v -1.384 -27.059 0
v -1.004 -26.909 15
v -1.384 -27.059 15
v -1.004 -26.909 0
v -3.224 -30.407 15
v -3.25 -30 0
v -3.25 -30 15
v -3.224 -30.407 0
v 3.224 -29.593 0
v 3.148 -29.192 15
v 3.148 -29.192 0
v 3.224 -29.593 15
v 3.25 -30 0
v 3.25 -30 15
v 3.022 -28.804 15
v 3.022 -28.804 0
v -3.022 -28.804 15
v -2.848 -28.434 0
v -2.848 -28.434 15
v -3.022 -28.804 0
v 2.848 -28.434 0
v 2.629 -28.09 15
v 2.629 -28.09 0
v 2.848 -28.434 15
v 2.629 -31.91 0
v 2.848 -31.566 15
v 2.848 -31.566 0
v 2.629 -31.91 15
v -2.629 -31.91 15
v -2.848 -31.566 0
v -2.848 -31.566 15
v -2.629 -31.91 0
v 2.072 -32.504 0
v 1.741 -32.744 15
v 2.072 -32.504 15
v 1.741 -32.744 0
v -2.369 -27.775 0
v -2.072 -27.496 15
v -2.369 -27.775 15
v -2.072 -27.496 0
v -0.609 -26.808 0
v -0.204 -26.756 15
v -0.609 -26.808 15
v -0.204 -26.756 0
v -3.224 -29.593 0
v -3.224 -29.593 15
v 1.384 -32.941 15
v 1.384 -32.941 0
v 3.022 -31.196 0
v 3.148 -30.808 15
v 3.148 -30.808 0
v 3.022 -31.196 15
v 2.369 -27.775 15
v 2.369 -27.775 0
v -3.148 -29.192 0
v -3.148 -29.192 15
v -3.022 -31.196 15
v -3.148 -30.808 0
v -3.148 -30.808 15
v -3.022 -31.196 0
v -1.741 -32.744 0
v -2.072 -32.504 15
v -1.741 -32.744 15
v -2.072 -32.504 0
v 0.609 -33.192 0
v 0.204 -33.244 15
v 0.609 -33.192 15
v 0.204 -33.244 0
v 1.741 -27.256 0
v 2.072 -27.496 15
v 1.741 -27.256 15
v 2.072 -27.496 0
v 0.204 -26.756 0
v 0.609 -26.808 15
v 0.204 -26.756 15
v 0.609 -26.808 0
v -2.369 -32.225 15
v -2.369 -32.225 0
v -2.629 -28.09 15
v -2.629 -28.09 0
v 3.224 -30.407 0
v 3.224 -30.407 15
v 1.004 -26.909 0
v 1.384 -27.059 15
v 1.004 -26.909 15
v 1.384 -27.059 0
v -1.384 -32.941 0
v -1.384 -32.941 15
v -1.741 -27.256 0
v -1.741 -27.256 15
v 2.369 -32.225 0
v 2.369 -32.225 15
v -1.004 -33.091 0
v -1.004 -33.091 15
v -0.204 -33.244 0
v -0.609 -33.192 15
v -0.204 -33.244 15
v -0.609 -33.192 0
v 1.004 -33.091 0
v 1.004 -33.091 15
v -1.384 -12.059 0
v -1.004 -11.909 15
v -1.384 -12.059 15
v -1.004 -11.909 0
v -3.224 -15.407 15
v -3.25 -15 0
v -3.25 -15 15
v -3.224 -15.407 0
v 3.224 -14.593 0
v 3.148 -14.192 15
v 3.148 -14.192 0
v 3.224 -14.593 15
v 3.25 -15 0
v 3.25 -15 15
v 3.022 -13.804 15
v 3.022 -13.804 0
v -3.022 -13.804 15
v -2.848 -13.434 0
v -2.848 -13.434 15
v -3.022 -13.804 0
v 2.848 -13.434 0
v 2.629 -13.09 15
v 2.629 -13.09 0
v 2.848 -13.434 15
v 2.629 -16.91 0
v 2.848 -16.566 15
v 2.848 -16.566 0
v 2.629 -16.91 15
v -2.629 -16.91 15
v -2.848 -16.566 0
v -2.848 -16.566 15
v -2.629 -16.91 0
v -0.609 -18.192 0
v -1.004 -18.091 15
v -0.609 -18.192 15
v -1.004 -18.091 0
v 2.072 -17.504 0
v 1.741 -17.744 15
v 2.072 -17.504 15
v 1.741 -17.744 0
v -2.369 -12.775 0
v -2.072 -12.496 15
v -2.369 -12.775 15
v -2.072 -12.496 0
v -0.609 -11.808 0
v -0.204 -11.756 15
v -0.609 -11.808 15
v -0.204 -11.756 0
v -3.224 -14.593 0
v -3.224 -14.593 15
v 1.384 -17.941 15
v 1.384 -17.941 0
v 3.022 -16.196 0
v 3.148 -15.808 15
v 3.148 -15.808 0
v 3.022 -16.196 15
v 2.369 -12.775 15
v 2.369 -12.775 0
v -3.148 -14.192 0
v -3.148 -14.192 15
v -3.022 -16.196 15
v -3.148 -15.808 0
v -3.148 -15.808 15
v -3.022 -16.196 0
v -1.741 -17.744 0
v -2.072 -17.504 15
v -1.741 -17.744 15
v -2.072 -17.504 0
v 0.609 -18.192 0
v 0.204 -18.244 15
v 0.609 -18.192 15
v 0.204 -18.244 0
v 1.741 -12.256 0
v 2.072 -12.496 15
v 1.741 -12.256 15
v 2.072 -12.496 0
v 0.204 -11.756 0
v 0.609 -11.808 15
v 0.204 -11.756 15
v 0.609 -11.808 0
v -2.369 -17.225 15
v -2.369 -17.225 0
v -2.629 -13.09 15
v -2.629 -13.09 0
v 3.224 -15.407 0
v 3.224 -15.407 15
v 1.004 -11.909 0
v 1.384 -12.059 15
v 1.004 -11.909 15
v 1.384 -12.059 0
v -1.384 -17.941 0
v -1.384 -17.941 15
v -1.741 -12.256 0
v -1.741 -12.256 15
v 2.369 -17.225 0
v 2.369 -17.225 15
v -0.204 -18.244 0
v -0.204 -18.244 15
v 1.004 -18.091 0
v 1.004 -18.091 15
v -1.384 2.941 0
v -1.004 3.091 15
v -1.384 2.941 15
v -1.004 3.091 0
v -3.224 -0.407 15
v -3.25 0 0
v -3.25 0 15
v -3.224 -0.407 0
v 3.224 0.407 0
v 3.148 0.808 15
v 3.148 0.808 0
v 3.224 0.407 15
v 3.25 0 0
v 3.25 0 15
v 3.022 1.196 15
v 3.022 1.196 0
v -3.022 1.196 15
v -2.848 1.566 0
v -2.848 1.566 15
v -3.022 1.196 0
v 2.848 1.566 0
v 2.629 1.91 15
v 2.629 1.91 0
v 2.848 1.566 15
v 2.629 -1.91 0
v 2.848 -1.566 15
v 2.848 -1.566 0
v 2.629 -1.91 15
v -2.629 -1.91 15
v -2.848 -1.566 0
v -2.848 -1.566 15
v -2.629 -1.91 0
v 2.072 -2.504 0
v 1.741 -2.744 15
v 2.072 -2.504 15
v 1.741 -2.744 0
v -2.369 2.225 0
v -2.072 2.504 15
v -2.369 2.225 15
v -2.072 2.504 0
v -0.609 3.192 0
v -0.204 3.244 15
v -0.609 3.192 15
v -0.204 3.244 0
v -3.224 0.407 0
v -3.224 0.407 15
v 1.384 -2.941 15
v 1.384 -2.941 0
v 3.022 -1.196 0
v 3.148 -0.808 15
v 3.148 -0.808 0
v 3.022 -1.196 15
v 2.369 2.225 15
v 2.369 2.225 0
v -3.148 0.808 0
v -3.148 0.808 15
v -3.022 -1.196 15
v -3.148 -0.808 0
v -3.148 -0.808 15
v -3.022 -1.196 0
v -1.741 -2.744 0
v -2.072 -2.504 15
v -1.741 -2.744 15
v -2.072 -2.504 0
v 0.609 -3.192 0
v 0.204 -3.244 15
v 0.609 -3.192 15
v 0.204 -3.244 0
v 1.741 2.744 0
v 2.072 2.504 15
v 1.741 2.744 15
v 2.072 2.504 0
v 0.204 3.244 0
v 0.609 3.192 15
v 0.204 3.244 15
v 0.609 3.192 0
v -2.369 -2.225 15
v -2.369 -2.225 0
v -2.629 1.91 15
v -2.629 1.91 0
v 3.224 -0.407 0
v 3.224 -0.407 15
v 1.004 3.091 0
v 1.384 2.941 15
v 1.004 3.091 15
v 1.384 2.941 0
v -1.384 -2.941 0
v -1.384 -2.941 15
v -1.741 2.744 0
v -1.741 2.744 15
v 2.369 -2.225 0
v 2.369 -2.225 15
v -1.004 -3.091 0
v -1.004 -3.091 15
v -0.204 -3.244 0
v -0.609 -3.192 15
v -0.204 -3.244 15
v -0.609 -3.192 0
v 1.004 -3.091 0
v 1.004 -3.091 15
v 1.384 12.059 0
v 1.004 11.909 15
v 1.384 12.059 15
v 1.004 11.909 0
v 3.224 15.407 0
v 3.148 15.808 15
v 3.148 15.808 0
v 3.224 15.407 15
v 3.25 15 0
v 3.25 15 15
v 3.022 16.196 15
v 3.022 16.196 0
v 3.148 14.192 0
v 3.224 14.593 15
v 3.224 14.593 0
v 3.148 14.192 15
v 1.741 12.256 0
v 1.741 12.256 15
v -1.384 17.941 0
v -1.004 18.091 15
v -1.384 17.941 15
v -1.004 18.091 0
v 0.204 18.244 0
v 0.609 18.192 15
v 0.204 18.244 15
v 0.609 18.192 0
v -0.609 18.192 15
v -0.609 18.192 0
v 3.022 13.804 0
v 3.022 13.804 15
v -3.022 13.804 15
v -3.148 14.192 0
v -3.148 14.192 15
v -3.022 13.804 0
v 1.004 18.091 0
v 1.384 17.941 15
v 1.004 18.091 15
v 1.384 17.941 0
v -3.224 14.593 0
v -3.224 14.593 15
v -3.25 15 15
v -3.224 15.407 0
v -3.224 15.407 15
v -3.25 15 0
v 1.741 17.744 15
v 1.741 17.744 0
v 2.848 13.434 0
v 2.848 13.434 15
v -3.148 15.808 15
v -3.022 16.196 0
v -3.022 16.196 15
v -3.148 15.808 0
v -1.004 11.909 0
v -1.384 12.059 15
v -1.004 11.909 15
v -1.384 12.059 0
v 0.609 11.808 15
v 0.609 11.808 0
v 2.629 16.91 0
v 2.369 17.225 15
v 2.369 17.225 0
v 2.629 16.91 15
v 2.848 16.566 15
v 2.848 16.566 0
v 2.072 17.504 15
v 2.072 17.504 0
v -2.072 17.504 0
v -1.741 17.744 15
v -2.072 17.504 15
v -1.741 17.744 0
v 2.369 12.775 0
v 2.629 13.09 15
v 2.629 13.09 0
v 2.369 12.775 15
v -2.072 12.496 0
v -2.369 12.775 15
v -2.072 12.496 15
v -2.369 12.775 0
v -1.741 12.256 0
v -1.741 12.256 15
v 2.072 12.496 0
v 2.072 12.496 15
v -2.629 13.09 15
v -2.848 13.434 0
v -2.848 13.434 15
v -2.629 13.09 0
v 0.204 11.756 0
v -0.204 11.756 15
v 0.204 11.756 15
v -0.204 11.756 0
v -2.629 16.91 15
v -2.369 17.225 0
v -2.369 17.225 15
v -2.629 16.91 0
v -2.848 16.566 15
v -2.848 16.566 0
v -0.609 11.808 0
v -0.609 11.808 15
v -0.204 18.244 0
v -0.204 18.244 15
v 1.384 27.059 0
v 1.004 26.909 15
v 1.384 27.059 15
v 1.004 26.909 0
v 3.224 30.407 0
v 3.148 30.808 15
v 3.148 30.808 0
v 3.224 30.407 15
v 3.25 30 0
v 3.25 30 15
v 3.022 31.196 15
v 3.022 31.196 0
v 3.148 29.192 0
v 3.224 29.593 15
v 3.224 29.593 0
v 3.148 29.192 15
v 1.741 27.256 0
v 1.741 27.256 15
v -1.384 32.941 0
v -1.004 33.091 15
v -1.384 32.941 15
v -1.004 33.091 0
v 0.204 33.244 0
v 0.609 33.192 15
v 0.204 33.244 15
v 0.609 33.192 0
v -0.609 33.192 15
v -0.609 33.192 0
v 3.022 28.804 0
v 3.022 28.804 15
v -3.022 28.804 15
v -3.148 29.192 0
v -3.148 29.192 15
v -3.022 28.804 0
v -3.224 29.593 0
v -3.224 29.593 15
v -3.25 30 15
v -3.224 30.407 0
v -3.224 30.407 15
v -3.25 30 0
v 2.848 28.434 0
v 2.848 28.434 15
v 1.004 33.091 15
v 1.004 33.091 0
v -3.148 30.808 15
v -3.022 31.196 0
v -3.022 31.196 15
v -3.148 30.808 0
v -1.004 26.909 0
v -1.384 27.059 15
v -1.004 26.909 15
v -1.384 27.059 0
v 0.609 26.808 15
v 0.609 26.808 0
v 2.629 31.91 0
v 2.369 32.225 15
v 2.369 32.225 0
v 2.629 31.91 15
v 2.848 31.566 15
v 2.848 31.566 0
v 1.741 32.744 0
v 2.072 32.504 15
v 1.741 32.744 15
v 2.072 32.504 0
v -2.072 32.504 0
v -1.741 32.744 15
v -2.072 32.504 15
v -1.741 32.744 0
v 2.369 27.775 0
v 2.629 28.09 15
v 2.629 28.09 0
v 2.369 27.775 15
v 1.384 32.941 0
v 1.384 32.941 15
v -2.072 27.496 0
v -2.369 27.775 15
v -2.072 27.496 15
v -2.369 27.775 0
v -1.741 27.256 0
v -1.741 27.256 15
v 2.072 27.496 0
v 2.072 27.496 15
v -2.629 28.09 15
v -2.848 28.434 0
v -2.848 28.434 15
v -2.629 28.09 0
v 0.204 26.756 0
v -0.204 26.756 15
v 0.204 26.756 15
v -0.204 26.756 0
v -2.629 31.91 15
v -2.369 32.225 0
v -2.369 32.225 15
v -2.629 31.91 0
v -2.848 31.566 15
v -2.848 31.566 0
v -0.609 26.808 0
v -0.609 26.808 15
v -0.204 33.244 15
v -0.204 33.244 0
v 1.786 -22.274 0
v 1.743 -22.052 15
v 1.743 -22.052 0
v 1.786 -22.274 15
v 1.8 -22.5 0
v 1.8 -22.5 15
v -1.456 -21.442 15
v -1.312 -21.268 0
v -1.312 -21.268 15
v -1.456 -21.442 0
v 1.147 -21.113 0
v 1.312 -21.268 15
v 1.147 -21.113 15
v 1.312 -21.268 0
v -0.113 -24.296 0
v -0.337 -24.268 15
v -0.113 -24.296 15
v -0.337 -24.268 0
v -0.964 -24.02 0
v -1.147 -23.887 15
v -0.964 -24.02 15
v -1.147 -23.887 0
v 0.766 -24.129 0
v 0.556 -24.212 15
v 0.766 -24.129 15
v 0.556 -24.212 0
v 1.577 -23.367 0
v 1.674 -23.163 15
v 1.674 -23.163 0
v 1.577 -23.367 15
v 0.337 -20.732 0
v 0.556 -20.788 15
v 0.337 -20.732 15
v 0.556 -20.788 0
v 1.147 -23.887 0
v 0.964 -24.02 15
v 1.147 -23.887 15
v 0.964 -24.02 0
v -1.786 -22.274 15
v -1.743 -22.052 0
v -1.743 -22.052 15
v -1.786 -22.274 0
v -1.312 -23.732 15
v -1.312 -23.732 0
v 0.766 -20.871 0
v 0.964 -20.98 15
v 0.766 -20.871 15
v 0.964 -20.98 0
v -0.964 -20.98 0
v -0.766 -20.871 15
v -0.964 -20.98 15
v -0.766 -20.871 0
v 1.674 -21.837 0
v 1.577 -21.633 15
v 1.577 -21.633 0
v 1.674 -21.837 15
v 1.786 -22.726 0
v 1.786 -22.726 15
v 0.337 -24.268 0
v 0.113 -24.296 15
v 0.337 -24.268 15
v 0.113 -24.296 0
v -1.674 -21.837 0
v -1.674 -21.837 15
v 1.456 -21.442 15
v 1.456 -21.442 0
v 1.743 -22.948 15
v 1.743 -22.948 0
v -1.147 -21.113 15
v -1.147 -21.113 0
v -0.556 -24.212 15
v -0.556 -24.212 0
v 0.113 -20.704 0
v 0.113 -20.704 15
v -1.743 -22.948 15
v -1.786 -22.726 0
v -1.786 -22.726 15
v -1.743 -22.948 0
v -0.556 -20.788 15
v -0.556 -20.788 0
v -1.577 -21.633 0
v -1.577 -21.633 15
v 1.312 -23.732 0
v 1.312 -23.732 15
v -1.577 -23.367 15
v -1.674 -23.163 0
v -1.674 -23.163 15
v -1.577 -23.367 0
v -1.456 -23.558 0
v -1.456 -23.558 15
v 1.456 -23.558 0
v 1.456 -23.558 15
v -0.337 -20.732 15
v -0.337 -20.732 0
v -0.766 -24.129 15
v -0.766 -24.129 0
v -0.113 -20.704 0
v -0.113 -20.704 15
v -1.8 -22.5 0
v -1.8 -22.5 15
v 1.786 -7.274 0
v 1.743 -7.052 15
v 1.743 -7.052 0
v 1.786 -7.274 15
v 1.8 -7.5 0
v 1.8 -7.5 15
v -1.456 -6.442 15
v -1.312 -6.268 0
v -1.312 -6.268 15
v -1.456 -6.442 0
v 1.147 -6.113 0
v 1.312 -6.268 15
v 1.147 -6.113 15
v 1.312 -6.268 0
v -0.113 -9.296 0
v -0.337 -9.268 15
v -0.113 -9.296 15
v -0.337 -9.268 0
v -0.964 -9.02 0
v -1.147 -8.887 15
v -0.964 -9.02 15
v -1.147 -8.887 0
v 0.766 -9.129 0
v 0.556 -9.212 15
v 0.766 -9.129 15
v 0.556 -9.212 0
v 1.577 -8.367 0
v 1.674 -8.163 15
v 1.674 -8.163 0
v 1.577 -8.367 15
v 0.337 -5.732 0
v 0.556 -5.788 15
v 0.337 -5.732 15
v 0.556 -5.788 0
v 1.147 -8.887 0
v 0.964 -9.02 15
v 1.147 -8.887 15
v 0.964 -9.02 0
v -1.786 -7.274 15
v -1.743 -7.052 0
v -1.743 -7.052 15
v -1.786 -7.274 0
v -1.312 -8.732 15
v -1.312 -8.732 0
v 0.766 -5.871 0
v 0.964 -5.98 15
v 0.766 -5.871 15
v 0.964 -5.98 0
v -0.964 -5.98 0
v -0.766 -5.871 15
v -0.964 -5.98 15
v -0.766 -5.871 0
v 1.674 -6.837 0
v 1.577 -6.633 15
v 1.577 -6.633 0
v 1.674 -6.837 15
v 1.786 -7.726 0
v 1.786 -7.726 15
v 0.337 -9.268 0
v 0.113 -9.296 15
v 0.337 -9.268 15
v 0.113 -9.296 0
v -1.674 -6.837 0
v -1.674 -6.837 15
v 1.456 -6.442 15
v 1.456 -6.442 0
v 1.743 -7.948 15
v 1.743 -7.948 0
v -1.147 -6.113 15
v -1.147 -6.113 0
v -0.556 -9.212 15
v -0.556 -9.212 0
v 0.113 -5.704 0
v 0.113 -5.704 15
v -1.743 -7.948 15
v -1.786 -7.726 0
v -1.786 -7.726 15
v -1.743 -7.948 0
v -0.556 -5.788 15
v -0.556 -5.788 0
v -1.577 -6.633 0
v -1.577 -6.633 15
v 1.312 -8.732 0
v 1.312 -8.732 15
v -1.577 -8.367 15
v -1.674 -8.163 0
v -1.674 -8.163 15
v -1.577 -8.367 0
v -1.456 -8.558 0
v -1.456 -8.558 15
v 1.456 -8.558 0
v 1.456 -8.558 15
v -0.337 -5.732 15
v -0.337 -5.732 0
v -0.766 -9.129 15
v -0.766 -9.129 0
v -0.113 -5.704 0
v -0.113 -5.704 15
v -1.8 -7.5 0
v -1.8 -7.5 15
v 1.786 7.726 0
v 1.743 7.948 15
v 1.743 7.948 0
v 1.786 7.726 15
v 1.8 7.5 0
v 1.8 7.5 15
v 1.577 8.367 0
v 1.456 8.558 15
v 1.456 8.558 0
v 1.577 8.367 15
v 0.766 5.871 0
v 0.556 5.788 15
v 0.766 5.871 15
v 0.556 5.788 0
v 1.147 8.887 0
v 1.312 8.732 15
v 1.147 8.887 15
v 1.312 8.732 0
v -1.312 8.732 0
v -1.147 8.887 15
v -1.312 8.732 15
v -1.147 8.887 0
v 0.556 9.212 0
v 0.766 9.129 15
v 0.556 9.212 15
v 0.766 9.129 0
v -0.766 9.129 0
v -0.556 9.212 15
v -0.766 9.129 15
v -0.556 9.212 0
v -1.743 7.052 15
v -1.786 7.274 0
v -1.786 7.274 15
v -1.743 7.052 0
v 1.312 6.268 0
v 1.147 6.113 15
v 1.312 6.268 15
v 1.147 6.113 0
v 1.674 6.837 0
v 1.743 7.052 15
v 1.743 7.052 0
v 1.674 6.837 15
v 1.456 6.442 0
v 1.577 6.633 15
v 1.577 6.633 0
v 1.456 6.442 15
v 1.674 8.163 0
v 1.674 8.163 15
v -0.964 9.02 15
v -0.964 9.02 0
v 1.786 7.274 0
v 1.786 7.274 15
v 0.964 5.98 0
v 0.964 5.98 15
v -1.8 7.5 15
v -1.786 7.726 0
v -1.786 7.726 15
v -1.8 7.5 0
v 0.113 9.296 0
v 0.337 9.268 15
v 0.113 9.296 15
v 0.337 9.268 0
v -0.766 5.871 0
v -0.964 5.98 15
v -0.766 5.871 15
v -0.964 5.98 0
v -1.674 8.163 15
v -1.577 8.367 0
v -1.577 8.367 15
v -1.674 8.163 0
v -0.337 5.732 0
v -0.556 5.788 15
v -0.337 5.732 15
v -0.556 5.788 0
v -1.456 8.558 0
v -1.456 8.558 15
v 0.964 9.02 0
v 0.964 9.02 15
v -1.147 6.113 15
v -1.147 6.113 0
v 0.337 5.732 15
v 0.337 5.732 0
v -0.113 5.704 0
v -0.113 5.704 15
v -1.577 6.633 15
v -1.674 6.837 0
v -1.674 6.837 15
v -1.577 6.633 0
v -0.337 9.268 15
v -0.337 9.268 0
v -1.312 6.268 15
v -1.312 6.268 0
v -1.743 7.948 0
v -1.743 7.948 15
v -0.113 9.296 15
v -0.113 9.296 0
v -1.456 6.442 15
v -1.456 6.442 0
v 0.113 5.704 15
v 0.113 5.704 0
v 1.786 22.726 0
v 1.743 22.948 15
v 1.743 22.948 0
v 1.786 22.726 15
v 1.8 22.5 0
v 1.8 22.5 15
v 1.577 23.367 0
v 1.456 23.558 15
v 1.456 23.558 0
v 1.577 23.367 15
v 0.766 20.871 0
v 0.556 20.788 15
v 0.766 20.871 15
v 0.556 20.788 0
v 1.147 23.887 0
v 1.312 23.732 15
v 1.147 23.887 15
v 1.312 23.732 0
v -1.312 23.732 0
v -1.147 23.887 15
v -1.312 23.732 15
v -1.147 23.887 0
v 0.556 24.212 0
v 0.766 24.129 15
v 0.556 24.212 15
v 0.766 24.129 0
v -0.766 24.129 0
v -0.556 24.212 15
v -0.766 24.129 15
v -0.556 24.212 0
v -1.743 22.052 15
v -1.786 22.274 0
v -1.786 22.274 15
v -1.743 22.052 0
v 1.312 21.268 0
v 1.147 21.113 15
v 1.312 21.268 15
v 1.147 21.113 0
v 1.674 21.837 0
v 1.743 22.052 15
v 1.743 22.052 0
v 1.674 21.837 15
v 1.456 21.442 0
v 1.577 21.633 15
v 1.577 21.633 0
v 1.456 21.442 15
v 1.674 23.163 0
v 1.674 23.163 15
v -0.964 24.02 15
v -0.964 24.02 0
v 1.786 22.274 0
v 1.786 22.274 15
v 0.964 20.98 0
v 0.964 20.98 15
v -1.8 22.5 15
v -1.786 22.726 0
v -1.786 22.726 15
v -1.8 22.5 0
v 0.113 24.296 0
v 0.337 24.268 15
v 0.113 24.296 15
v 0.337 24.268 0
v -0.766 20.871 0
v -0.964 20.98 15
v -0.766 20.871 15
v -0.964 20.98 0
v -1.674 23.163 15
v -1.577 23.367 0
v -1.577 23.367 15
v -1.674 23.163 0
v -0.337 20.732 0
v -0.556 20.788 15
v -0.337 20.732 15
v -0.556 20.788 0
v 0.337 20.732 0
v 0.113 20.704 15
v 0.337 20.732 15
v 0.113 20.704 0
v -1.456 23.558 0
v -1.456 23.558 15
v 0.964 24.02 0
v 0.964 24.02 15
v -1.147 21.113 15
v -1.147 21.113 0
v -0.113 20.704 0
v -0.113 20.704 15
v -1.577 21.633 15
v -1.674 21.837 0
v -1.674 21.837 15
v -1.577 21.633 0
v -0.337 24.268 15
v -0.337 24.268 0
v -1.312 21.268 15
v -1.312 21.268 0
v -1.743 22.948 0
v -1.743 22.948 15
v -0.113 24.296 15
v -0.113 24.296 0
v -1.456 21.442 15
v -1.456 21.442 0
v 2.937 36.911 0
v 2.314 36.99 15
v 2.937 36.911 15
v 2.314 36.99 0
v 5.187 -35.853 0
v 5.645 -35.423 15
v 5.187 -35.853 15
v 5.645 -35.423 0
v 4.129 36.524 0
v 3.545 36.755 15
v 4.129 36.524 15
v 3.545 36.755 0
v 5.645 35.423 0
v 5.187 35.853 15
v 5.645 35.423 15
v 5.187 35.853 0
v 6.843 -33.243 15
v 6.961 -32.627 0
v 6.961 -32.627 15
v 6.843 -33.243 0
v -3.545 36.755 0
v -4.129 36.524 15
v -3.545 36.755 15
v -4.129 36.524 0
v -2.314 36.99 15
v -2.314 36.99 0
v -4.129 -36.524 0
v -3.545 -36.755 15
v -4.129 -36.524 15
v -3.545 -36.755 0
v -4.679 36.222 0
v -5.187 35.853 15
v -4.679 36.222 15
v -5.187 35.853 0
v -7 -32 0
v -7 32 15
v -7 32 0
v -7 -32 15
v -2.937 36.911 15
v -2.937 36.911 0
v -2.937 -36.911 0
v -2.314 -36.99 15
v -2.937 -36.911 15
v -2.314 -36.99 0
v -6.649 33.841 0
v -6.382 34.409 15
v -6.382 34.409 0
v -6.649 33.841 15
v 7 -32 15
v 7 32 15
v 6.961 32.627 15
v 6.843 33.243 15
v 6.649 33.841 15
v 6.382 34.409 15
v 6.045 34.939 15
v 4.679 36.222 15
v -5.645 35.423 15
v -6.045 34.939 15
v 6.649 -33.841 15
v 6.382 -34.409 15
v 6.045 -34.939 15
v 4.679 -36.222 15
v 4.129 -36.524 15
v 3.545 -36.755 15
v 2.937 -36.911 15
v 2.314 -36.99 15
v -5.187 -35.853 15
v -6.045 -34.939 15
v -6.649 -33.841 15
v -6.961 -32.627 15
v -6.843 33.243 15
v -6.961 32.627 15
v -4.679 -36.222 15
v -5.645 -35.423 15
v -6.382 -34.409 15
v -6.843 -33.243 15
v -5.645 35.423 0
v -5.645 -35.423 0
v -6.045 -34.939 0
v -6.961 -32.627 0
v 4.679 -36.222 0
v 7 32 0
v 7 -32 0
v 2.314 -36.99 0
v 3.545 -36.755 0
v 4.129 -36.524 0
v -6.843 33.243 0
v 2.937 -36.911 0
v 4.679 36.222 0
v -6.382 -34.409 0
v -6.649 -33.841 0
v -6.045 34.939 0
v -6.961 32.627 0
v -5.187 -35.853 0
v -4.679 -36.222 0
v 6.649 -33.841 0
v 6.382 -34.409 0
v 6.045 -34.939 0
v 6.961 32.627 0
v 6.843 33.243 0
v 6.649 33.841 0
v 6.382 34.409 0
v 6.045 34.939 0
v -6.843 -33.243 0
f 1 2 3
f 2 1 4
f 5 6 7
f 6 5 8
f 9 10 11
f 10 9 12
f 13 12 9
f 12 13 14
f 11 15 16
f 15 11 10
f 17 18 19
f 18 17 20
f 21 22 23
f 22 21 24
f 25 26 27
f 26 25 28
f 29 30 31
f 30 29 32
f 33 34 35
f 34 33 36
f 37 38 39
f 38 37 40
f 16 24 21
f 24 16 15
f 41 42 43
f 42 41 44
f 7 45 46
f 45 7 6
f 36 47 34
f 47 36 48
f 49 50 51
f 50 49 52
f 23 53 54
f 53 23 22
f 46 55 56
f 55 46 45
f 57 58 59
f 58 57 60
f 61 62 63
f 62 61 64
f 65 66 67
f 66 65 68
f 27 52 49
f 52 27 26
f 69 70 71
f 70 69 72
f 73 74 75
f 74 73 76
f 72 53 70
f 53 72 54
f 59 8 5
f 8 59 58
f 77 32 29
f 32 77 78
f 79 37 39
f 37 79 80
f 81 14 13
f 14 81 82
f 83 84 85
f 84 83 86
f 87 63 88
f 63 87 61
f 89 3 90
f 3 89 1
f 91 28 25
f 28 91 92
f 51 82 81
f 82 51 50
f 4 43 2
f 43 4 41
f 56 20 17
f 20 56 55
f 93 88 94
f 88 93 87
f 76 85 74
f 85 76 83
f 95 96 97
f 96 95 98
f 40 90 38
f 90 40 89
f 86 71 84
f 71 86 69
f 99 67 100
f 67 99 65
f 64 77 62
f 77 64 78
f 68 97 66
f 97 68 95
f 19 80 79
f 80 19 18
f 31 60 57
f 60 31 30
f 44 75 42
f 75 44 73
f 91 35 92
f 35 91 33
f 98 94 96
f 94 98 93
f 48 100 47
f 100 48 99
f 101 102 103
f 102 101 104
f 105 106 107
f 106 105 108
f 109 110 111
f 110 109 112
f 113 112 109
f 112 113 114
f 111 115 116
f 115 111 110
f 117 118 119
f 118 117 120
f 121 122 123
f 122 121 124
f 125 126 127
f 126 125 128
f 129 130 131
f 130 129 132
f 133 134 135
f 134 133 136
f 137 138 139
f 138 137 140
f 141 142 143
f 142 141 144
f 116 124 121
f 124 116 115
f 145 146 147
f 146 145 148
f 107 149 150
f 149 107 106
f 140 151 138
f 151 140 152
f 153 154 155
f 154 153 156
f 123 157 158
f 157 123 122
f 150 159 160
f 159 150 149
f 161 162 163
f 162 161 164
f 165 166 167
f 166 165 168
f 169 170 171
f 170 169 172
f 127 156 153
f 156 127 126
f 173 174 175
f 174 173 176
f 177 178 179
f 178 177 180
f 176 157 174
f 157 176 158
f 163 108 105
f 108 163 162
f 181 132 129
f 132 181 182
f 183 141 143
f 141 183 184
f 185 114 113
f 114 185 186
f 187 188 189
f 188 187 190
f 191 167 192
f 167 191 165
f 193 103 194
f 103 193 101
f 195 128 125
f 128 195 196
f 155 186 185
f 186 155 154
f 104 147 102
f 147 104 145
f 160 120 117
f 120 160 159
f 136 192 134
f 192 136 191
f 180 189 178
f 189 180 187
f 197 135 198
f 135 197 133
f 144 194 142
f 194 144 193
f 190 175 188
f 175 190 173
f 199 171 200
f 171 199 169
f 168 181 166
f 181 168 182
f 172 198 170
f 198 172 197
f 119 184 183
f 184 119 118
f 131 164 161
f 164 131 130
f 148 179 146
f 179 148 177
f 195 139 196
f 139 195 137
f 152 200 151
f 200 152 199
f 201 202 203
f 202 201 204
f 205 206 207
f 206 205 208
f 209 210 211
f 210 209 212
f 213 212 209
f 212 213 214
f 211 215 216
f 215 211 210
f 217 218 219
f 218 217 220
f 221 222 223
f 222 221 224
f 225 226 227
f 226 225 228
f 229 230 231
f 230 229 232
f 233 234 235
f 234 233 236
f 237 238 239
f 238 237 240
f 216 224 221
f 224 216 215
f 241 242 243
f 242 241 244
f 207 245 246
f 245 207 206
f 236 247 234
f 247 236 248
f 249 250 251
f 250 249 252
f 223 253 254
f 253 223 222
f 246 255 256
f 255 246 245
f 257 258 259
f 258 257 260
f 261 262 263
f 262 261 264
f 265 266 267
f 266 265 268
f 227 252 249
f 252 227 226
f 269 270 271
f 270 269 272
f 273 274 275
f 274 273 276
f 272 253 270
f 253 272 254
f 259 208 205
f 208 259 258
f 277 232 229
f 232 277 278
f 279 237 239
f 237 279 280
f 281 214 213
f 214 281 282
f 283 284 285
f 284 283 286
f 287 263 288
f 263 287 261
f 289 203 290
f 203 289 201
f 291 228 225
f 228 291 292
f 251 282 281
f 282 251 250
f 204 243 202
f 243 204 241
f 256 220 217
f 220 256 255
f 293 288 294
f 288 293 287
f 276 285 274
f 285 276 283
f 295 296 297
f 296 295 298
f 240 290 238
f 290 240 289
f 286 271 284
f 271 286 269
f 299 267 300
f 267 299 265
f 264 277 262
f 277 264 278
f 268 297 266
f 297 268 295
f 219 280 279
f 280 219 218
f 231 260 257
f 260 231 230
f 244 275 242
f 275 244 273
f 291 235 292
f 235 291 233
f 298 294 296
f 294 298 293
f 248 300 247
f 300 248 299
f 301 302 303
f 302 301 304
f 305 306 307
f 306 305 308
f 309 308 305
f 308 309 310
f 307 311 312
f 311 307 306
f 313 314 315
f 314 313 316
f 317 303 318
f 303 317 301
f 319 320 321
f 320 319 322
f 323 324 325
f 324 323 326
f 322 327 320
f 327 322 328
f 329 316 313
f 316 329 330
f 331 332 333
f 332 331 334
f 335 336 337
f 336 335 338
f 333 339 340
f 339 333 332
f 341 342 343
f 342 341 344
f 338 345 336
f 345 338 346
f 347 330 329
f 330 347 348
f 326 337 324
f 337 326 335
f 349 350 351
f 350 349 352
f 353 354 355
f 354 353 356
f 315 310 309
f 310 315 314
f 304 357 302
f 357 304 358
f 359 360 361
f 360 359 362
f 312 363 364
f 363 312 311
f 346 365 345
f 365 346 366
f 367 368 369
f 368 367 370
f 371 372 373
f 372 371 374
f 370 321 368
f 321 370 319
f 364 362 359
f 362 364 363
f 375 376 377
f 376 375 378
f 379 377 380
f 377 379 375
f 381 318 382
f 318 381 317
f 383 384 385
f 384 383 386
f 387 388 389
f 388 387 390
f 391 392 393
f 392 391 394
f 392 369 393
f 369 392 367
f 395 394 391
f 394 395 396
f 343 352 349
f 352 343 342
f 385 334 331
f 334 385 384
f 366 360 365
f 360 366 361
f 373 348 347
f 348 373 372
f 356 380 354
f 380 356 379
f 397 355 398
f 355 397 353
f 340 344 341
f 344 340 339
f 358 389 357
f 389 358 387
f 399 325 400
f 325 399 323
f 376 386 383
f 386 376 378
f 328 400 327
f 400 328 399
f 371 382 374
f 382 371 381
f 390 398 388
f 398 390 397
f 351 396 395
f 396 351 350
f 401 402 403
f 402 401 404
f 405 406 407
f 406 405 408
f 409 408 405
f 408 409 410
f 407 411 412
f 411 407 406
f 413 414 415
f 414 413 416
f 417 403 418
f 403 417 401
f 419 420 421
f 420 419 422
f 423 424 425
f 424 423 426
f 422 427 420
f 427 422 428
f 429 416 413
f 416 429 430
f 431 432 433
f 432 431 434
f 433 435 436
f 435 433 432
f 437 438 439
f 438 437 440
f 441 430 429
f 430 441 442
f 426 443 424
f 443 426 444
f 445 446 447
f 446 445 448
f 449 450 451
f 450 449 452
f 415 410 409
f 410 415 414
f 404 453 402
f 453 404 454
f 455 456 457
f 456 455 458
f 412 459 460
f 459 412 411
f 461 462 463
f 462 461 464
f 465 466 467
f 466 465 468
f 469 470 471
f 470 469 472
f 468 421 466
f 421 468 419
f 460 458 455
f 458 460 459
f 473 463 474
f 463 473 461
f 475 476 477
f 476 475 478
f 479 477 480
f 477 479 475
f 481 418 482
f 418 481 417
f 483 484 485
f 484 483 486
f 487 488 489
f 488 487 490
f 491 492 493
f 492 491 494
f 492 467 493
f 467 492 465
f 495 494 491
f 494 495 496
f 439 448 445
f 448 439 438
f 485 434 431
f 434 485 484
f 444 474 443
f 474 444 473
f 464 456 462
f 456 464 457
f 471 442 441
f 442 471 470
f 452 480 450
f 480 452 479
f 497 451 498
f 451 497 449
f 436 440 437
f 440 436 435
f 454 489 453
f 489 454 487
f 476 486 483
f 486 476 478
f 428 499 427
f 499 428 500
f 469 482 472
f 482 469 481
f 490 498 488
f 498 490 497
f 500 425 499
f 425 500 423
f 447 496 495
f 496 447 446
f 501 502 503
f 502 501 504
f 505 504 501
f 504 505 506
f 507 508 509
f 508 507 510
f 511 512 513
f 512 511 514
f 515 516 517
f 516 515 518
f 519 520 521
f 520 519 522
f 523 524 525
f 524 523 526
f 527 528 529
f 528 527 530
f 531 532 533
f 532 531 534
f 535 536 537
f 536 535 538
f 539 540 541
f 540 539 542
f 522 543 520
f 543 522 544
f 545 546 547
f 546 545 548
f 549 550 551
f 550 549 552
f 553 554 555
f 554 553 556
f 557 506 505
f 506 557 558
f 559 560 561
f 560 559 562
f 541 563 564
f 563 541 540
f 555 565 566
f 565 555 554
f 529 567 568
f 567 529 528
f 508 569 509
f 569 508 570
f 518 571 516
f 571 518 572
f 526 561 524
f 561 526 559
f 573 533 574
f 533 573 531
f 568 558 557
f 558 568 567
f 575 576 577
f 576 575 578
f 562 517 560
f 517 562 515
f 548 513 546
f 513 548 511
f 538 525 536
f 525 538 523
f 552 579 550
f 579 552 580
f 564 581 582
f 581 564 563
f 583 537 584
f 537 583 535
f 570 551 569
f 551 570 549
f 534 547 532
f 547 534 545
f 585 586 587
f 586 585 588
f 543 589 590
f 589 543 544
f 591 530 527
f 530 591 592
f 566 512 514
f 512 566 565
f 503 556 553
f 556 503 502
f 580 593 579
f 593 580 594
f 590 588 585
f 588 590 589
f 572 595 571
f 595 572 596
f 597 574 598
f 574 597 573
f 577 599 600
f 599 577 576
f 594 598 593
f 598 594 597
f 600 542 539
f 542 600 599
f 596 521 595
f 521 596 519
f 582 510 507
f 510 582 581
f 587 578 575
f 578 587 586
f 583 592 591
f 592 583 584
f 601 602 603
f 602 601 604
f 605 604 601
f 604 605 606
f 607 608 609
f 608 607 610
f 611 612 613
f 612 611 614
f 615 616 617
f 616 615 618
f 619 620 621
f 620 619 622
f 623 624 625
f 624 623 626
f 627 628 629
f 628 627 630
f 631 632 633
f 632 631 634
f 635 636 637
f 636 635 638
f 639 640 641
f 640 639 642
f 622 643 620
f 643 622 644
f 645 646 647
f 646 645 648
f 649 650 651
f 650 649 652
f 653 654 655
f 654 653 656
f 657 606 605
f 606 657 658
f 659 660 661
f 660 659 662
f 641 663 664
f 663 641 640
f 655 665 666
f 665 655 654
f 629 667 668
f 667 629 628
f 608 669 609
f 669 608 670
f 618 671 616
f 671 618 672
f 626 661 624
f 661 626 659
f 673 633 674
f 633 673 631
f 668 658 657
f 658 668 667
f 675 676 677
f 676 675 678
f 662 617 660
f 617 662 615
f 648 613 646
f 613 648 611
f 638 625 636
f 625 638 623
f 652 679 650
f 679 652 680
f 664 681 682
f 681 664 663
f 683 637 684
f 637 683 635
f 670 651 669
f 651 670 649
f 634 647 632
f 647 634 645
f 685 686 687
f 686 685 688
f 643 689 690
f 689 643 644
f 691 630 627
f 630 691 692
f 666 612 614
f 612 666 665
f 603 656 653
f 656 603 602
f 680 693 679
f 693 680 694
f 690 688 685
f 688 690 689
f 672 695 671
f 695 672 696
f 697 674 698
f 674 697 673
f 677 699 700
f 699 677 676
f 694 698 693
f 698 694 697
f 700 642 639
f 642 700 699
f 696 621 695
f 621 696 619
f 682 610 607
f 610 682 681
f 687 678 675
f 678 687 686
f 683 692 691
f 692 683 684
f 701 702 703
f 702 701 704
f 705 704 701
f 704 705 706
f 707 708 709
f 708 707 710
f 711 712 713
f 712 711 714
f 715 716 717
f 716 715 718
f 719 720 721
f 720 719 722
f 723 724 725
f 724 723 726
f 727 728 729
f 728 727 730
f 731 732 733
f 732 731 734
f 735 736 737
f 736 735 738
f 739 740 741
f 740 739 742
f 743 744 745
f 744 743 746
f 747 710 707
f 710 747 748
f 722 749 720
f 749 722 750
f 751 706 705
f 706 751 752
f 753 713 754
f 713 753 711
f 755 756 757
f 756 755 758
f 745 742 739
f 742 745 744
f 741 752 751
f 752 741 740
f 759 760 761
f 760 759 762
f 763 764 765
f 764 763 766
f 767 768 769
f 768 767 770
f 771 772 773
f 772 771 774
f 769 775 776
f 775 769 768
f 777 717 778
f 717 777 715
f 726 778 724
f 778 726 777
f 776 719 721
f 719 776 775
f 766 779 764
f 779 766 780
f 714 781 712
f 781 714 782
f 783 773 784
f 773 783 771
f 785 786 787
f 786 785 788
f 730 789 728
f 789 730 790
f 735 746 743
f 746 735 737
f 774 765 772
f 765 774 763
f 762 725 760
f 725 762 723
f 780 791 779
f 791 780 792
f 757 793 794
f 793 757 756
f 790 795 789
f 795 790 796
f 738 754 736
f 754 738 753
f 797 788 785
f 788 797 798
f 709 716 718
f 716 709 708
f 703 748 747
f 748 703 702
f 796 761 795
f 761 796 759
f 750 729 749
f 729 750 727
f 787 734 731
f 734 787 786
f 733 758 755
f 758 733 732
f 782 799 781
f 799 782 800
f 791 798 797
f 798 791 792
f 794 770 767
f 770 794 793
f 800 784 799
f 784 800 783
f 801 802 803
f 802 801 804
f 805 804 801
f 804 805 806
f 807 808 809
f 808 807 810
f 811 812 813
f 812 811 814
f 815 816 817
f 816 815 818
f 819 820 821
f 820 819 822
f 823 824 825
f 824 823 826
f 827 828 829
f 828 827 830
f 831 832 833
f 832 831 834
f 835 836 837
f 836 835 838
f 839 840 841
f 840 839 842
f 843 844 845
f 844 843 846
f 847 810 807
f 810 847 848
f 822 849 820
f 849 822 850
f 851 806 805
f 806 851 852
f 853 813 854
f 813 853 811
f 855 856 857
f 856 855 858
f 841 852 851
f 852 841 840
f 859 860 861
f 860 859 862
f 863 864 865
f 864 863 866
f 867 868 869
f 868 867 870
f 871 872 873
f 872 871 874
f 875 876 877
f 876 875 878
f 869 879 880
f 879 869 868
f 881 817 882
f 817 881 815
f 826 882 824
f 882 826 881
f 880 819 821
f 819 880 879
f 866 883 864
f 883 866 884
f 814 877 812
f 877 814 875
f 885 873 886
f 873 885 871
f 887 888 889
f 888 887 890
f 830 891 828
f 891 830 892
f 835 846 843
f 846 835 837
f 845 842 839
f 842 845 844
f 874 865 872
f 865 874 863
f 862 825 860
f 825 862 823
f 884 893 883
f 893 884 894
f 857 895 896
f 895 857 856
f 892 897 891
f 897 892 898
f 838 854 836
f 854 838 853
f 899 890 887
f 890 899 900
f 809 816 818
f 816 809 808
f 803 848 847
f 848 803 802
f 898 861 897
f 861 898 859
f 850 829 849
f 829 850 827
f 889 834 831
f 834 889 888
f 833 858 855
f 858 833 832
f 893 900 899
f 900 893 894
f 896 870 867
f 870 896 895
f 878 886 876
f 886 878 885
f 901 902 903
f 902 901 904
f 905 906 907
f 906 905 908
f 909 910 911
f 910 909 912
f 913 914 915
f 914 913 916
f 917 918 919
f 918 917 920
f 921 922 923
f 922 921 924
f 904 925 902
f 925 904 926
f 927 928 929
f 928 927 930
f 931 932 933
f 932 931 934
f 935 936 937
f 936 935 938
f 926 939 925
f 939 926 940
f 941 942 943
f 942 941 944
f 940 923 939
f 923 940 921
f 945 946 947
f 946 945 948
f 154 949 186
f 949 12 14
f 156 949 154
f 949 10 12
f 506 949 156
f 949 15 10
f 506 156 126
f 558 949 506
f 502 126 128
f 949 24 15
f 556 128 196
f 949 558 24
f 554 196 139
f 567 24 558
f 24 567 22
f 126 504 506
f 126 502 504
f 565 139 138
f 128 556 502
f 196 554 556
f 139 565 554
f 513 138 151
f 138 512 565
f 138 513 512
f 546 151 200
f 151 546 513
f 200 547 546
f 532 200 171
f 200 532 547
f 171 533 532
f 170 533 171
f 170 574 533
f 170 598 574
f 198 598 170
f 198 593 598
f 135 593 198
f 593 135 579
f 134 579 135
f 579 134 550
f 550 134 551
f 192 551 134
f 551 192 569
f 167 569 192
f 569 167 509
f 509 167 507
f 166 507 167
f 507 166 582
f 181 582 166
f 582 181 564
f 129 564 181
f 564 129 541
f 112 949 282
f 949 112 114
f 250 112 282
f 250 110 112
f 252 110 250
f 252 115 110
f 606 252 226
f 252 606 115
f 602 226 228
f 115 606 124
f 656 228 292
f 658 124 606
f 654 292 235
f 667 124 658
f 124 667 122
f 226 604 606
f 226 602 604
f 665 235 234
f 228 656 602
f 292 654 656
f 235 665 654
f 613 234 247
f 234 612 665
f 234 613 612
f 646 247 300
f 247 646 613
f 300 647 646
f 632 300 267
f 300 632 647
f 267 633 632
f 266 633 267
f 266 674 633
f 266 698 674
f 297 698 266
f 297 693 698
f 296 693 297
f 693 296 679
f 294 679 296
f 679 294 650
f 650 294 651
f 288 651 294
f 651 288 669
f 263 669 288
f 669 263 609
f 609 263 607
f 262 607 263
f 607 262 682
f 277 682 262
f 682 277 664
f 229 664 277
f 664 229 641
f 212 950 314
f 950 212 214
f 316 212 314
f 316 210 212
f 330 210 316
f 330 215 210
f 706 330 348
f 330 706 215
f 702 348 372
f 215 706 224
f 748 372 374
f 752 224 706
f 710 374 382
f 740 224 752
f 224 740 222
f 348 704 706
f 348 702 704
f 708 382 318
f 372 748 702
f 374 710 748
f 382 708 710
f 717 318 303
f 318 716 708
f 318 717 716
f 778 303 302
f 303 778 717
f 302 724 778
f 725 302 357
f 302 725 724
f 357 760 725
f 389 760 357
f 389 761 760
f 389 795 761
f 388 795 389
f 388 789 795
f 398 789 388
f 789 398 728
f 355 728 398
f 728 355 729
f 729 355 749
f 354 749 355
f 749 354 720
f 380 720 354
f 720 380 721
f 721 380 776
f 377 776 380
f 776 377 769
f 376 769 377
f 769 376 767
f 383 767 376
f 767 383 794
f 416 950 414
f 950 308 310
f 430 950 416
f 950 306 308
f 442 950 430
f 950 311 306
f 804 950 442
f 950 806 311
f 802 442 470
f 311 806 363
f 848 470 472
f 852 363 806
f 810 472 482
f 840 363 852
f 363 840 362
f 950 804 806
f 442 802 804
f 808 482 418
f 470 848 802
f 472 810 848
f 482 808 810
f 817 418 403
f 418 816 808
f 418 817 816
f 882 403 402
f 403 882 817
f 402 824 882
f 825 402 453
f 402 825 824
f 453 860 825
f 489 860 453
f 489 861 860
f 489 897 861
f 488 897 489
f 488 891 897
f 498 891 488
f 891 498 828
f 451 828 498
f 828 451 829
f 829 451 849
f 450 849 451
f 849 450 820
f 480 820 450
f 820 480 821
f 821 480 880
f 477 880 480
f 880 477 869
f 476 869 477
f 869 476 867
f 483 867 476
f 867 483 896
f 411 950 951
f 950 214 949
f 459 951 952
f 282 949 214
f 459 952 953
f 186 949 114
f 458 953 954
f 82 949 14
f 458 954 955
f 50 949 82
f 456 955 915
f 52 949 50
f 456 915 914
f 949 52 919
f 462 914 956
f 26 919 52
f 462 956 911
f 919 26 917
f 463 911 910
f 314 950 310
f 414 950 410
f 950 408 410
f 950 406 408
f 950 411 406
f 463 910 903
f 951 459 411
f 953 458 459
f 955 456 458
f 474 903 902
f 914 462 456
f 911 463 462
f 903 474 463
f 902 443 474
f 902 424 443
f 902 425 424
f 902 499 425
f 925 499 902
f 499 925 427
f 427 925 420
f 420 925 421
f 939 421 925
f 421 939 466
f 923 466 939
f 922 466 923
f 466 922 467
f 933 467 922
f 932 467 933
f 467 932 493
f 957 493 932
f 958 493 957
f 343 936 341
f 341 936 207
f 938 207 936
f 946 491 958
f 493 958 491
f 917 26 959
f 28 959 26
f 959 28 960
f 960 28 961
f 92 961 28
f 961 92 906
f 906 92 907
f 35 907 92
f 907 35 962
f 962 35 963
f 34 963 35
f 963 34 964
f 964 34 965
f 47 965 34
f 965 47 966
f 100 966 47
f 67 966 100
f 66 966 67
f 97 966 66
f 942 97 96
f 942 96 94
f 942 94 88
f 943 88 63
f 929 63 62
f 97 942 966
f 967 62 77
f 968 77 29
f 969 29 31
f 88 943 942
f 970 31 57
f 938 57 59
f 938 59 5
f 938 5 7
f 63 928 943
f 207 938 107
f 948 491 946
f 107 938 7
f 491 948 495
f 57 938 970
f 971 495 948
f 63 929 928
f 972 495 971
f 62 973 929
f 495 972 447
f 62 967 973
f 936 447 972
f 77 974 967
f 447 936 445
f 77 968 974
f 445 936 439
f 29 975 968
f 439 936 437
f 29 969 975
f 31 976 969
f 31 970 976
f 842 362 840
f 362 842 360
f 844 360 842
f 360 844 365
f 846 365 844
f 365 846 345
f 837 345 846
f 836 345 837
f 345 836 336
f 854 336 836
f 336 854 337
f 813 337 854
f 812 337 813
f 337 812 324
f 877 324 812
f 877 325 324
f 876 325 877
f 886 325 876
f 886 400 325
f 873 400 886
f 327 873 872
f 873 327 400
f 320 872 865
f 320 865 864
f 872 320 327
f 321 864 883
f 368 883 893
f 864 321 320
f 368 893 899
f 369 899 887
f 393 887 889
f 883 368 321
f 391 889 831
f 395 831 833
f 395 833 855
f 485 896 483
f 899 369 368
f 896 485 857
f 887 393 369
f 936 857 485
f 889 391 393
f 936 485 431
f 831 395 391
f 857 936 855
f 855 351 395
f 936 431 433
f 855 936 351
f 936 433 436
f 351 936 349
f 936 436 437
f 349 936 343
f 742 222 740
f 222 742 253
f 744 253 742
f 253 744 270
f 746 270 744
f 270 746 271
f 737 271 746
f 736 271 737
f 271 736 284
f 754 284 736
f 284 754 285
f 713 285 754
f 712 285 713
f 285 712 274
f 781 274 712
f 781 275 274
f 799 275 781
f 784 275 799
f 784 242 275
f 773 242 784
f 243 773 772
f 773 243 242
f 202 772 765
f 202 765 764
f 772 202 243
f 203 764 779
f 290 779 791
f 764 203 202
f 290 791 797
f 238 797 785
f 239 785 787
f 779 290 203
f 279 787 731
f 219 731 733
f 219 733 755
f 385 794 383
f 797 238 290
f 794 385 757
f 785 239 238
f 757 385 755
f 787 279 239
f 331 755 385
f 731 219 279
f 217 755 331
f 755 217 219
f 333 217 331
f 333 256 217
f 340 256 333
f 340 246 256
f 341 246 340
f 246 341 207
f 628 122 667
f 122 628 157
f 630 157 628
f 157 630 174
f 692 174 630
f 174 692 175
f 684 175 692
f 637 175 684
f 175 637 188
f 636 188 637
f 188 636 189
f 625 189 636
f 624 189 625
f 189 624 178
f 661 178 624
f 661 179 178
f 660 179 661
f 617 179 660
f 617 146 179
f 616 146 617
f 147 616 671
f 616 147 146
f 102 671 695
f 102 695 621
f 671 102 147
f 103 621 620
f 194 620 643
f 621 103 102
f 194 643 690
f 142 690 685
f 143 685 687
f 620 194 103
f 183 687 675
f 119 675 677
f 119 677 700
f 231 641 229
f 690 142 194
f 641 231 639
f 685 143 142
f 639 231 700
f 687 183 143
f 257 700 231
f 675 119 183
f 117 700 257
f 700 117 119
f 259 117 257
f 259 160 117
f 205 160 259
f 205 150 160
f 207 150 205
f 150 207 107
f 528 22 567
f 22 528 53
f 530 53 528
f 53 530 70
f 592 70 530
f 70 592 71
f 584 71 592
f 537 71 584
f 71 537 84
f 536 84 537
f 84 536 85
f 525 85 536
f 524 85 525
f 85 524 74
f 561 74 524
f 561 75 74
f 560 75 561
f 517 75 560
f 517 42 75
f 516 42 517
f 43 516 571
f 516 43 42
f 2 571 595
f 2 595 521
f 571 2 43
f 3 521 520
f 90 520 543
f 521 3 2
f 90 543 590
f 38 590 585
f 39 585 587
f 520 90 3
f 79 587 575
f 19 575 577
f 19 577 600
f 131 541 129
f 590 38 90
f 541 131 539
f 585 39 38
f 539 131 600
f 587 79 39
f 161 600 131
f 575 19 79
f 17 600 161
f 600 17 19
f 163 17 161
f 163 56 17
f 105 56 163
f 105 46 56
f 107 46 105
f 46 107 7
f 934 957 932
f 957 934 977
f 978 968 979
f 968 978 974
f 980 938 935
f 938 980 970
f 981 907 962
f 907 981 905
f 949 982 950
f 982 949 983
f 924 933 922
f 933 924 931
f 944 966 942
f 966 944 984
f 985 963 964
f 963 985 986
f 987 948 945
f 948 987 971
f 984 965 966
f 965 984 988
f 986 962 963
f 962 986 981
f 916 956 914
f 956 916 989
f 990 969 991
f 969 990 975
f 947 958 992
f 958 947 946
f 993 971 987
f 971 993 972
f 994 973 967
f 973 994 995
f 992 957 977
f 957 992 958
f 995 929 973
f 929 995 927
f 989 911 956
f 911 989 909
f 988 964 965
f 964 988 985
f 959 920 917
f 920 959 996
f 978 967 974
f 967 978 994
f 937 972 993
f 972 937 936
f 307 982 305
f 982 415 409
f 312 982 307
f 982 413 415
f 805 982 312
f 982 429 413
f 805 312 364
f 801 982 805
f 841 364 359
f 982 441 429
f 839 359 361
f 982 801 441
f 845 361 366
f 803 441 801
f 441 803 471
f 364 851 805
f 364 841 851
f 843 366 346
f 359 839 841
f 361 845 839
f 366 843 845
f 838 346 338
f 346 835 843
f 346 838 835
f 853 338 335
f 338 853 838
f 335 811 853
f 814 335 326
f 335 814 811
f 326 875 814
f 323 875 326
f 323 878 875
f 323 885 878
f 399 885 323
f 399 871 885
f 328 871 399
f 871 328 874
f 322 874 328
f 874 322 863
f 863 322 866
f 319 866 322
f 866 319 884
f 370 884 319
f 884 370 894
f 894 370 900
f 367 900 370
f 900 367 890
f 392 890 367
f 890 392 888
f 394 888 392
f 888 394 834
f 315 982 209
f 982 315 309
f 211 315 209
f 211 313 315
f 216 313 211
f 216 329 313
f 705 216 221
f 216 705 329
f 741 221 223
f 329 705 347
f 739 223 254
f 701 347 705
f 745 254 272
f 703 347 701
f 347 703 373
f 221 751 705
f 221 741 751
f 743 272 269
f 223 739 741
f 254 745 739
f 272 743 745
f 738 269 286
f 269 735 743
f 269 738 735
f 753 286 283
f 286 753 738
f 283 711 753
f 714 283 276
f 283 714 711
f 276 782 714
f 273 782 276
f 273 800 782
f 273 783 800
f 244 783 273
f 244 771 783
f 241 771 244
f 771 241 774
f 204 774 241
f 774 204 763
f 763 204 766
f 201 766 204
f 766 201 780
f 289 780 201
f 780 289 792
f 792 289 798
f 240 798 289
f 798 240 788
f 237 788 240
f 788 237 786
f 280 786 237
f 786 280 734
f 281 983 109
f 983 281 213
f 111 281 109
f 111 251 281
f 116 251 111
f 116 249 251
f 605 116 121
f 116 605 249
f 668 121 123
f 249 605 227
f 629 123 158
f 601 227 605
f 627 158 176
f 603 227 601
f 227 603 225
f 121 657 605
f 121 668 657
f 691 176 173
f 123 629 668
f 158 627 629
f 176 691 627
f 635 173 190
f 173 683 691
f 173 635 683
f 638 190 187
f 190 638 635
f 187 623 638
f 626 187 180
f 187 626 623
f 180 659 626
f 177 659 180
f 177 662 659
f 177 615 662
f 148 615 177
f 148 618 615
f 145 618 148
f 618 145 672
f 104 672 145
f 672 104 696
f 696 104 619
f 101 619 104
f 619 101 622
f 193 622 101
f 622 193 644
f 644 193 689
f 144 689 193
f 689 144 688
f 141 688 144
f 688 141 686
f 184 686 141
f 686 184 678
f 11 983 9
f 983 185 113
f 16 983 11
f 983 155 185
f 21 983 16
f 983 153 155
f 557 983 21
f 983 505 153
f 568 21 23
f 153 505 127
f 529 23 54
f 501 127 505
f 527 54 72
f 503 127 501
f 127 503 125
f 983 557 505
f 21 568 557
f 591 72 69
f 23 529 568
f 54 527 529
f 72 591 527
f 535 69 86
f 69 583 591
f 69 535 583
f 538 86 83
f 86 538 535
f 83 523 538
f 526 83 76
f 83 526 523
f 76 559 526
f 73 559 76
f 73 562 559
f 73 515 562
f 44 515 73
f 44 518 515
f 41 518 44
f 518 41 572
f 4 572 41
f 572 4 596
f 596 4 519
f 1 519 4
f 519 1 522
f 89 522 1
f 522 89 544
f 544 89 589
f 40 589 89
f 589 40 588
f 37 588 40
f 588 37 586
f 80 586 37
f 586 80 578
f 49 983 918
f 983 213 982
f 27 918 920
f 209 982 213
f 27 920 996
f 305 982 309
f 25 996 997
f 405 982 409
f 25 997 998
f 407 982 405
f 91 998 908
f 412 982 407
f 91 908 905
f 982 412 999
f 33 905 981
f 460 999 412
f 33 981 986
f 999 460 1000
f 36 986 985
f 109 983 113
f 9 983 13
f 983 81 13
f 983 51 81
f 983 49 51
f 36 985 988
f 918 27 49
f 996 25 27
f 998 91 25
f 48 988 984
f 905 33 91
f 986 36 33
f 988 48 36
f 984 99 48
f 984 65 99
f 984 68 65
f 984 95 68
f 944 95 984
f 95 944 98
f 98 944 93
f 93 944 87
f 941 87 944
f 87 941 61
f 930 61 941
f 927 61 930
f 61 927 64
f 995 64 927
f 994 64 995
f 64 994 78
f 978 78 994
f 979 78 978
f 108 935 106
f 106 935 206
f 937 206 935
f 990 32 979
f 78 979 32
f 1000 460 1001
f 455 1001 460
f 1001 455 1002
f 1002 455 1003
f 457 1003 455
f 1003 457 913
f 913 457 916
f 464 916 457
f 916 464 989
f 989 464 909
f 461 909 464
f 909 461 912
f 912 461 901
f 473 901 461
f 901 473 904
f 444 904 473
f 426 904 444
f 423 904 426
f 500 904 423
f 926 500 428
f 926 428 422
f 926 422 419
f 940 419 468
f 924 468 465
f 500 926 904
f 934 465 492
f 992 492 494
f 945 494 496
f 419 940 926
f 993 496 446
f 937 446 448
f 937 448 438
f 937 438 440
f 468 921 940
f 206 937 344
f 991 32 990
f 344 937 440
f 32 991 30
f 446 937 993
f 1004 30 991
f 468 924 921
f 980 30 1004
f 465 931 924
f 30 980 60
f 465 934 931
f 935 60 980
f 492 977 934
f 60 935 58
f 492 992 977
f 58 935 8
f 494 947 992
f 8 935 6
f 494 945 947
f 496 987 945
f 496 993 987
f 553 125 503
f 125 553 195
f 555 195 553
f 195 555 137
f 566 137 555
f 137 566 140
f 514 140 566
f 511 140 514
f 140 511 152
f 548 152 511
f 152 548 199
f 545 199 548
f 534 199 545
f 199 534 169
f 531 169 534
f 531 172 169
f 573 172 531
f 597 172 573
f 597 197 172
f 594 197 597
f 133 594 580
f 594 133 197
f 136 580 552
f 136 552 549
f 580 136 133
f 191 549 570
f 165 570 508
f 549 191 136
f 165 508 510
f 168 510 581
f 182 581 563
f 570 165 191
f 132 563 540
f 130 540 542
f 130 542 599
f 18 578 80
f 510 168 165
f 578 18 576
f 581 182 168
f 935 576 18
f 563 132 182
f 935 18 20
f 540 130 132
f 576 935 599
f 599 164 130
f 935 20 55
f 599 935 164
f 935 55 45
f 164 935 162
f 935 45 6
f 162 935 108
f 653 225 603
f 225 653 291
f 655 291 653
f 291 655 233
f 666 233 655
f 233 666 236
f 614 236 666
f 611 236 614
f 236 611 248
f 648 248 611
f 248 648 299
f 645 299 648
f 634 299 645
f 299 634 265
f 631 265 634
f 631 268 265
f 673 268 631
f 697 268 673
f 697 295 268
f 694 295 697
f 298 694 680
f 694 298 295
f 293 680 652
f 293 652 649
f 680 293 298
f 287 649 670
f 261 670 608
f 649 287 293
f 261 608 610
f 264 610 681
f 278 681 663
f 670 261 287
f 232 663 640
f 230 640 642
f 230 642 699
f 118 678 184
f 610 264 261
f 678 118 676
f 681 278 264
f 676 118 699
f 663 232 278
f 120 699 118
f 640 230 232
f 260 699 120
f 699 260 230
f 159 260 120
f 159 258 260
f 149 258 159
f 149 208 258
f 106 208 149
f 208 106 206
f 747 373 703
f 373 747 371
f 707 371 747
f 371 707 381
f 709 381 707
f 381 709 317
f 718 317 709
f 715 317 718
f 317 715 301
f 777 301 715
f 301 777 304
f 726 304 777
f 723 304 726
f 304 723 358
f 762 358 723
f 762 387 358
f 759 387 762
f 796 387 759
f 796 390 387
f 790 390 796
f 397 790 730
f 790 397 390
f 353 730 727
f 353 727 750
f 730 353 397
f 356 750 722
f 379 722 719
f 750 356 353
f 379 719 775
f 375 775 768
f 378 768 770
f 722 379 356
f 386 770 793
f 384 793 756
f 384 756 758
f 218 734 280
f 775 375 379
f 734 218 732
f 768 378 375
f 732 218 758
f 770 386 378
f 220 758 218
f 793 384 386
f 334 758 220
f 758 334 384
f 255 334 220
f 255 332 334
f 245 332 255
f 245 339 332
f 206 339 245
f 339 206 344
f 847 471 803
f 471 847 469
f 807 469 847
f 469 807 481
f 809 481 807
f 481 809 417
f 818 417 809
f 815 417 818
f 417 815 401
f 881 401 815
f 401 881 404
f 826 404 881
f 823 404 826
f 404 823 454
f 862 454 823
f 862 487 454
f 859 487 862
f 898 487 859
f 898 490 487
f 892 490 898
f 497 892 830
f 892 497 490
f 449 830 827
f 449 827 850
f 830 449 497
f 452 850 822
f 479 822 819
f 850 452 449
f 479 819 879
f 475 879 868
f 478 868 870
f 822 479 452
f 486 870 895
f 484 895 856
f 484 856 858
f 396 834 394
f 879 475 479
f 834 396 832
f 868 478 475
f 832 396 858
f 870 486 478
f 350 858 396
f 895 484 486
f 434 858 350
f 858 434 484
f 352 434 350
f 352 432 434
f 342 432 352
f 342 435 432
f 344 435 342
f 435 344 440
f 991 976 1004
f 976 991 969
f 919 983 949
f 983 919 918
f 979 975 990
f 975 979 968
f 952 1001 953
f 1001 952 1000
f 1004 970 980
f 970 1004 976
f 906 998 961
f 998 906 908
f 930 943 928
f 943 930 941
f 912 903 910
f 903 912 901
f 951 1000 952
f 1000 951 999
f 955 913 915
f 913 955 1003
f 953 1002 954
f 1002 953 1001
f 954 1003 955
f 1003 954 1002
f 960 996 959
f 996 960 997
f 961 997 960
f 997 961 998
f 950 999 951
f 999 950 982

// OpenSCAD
$fn = 50;

difference() {
	union() {
		hull() {
			translate(v = [-2.0, 32.0, 0]) {
				cylinder(h = 15, r = 5);
			}
			translate(v = [2.0, 32.0, 0]) {
				cylinder(h = 15, r = 5);
			}
			translate(v = [-2.0, -32.0, 0]) {
				cylinder(h = 15, r = 5);
			}
			translate(v = [2.0, -32.0, 0]) {
				cylinder(h = 15, r = 5);
			}
		}
	}
	union() {
		translate(v = [0.0, -30.0, 0]) {
			translate(v = [0, 0, -100]) {
				cylinder(h = 200, r = 3.25);
			}
		}
		translate(v = [0.0, -15.0, 0]) {
			translate(v = [0, 0, -100]) {
				cylinder(h = 200, r = 3.25);
			}
		}
		translate(v = [0, 0, -100]) {
			cylinder(h = 200, r = 3.25);
		}
		translate(v = [0.0, 15.0, 0]) {
			translate(v = [0, 0, -100]) {
				cylinder(h = 200, r = 3.25);
			}
		}
		translate(v = [0.0, 30.0, 0]) {
			translate(v = [0, 0, -100]) {
				cylinder(h = 200, r = 3.25);
			}
		}
		translate(v = [0.0, -30.0, 0]) {
			translate(v = [0, 0, -100]) {
				cylinder(h = 200, r = 1.8);
			}
		}
		translate(v = [0.0, -22.5, 0]) {
			translate(v = [0, 0, -100]) {
				cylinder(h = 200, r = 1.8);
			}
		}
		translate(v = [0.0, -15.0, 0]) {
			translate(v = [0, 0, -100]) {
				cylinder(h = 200, r = 1.8);
			}
		}
		translate(v = [0.0, -7.5, 0]) {
			translate(v = [0, 0, -100]) {
				cylinder(h = 200, r = 1.8);
			}
		}
		translate(v = [0, 0, -100]) {
			cylinder(h = 200, r = 1.8);
		}
		translate(v = [0.0, 7.5, 0]) {
			translate(v = [0, 0, -100]) {
				cylinder(h = 200, r = 1.8);
			}
		}
		translate(v = [0.0, 15.0, 0]) {
			translate(v = [0, 0, -100]) {
				cylinder(h = 200, r = 1.8);
			}
		}
		translate(v = [0.0, 22.5, 0]) {
			translate(v = [0, 0, -100]) {
				cylinder(h = 200, r = 1.8);
			}
		}
		translate(v = [0.0, 30.0, 0]) {
			translate(v = [0, 0, -100]) {
				cylinder(h = 200, r = 1.8);
			}
		}
	}
}
